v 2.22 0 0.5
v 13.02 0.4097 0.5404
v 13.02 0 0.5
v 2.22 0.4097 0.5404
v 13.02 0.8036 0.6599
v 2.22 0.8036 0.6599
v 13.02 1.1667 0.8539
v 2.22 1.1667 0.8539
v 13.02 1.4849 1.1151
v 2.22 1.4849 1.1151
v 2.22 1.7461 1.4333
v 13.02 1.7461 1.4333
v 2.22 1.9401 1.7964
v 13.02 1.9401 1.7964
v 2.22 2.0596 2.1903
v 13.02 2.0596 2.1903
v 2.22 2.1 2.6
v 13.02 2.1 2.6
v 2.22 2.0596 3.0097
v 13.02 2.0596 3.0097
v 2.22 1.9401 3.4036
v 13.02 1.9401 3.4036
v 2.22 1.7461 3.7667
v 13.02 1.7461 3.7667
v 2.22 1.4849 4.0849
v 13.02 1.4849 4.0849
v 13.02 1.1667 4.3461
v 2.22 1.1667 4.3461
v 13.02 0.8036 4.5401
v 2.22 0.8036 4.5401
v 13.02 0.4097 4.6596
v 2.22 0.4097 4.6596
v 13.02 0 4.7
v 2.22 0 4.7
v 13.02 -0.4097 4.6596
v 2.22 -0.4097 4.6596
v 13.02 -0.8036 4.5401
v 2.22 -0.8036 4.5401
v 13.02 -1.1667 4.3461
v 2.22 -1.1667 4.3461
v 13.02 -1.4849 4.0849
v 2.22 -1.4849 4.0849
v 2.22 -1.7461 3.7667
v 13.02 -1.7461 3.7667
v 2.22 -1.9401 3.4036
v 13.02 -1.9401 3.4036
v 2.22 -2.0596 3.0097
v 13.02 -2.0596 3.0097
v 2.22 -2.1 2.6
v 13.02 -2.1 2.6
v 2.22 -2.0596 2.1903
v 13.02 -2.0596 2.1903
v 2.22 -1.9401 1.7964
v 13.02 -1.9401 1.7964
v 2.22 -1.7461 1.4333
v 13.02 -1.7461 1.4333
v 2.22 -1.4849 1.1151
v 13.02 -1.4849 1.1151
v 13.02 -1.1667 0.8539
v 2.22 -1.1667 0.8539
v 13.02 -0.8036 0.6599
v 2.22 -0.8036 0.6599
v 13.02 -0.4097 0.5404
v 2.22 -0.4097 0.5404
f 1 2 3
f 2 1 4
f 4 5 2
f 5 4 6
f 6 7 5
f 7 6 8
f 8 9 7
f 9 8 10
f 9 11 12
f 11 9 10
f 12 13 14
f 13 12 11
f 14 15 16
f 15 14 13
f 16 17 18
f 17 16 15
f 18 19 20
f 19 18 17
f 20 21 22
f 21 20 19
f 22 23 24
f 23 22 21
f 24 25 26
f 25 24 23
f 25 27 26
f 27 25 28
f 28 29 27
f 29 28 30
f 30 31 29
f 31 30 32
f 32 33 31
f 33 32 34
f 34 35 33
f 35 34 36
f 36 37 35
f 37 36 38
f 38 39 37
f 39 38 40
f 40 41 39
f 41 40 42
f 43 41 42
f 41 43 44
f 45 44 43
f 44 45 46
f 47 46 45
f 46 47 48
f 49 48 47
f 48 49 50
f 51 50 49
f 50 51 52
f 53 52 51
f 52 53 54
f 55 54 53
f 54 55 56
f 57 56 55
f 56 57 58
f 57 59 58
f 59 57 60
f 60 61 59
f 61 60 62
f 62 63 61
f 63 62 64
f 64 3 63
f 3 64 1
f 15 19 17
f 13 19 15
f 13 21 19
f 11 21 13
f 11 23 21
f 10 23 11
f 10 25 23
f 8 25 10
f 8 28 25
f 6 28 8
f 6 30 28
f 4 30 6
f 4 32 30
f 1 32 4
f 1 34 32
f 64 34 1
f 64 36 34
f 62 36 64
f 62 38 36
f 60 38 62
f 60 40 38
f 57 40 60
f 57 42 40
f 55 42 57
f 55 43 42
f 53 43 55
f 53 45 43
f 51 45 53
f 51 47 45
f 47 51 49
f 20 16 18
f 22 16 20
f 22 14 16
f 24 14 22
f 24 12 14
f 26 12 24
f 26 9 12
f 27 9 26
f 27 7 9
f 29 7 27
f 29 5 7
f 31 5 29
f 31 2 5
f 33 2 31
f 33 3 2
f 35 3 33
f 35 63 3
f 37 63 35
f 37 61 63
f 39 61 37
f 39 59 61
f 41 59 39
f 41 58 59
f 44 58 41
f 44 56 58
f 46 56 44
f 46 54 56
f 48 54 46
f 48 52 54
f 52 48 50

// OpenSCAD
// An axial part lying on the board, bent leads into two holes: the МЛТ-0,5 resistors (R27..R32, R56..R63)
// and the Bourns 5900 choke L1. Made for 3d/populated.
//
// layers: body=#7d8140 band=#8a2b1d leads=#c9c9c9
// variants: mlt05_lying BODY_D=4.2 BODY_L=10.8 PITCH=15.24 AXIS=2.6 STYLE=0 ; l1_axial BODY_D=11.5 BODY_L=22.9 PITCH=27.94 AXIS=6.0 STYLE=1 COLOR_body=#2b2d33 COLOR_band=#2b2d33
//
// FRAME  KiCad model frame. Pad 1 at (0, 0), pad 2 at (PITCH, 0): TS06_R_Axial_MLT-0.5_P15.24mm and
//        TS06_L_Axial_D11.5mm_L22.9mm_P27.94mm. The _R180/_R270 copies take the variant rule.
//
// DIMENSIONS                      value             kind
//   МЛТ-0,5   BODY_D 4.2, BODY_L 10.8, leads D0.8, pitch 15.24     MEASURED (repo source): the footprint's own descr and
//                                                  PCB/TS06-DRV/bom.md ("body <= D4.2 x 10.8 mm, leads D0.8")
//   L1        BODY_D 11.5, BODY_L 22.9, leads D0.8, pitch 27.94    MEASURED (repo source): footprint descr and bom.md
//                                                  (Bourns 5900-221-RC data)
//   AXIS      2.6 / 6.0 above the board face      INFERRED: the footprint states "height=4.7mm" / "height=12mm" for a
//                                                  lying part; the axis is put at height - D/2 so the body top is there
//   leads     bent 90 deg at the body, 2.5 mm through the board                INFERRED
//   STYLE 0 draws the resistor (olive body, three bands); STYLE 1 the choke (dark body, plain).
BODY_D = 4.2;
BODY_L = 10.8;
PITCH = 15.24;
AXIS = 2.6;
STYLE = 0;
L = "body";
LEAD_D = 0.8;
cx = PITCH / 2;
x0 = cx - BODY_L / 2;
x1 = cx + BODY_L / 2;
// a part of the 4.2 mm resistor rides 0.5 mm up (axis 2.6 - radius 2.1); the choke 0.25 mm (6.0 - 5.75)

module along_x(x, len, d) { translate([x, 0, AXIS]) rotate([0, 90, 0]) cylinder(d = d, h = len, $fn = 32); }
module vert(x, z0, z1) { translate([x, 0, z0]) cylinder(d = LEAD_D, h = z1 - z0, $fn = 12); }

if (L == "body") {
    along_x(x0, BODY_L, BODY_D);
}
if (L == "band" && STYLE == 0) {
    for (k = [0 : 2]) along_x(x0 + 1.6 + k * 1.3, 0.7, BODY_D + 0.04);
    along_x(x1 - 1.4, 0.7, BODY_D + 0.04);
}
if (L == "leads") {
    vert(0, -2.5, AXIS);
    vert(PITCH, -2.5, AXIS);
    translate([0, 0, AXIS]) sphere(d = LEAD_D, $fn = 12);
    translate([PITCH, 0, AXIS]) sphere(d = LEAD_D, $fn = 12);
    along_x(0, x0 + 0.1, LEAD_D);
    along_x(x1 - 0.1, PITCH - x1 + 0.1, LEAD_D);
}
